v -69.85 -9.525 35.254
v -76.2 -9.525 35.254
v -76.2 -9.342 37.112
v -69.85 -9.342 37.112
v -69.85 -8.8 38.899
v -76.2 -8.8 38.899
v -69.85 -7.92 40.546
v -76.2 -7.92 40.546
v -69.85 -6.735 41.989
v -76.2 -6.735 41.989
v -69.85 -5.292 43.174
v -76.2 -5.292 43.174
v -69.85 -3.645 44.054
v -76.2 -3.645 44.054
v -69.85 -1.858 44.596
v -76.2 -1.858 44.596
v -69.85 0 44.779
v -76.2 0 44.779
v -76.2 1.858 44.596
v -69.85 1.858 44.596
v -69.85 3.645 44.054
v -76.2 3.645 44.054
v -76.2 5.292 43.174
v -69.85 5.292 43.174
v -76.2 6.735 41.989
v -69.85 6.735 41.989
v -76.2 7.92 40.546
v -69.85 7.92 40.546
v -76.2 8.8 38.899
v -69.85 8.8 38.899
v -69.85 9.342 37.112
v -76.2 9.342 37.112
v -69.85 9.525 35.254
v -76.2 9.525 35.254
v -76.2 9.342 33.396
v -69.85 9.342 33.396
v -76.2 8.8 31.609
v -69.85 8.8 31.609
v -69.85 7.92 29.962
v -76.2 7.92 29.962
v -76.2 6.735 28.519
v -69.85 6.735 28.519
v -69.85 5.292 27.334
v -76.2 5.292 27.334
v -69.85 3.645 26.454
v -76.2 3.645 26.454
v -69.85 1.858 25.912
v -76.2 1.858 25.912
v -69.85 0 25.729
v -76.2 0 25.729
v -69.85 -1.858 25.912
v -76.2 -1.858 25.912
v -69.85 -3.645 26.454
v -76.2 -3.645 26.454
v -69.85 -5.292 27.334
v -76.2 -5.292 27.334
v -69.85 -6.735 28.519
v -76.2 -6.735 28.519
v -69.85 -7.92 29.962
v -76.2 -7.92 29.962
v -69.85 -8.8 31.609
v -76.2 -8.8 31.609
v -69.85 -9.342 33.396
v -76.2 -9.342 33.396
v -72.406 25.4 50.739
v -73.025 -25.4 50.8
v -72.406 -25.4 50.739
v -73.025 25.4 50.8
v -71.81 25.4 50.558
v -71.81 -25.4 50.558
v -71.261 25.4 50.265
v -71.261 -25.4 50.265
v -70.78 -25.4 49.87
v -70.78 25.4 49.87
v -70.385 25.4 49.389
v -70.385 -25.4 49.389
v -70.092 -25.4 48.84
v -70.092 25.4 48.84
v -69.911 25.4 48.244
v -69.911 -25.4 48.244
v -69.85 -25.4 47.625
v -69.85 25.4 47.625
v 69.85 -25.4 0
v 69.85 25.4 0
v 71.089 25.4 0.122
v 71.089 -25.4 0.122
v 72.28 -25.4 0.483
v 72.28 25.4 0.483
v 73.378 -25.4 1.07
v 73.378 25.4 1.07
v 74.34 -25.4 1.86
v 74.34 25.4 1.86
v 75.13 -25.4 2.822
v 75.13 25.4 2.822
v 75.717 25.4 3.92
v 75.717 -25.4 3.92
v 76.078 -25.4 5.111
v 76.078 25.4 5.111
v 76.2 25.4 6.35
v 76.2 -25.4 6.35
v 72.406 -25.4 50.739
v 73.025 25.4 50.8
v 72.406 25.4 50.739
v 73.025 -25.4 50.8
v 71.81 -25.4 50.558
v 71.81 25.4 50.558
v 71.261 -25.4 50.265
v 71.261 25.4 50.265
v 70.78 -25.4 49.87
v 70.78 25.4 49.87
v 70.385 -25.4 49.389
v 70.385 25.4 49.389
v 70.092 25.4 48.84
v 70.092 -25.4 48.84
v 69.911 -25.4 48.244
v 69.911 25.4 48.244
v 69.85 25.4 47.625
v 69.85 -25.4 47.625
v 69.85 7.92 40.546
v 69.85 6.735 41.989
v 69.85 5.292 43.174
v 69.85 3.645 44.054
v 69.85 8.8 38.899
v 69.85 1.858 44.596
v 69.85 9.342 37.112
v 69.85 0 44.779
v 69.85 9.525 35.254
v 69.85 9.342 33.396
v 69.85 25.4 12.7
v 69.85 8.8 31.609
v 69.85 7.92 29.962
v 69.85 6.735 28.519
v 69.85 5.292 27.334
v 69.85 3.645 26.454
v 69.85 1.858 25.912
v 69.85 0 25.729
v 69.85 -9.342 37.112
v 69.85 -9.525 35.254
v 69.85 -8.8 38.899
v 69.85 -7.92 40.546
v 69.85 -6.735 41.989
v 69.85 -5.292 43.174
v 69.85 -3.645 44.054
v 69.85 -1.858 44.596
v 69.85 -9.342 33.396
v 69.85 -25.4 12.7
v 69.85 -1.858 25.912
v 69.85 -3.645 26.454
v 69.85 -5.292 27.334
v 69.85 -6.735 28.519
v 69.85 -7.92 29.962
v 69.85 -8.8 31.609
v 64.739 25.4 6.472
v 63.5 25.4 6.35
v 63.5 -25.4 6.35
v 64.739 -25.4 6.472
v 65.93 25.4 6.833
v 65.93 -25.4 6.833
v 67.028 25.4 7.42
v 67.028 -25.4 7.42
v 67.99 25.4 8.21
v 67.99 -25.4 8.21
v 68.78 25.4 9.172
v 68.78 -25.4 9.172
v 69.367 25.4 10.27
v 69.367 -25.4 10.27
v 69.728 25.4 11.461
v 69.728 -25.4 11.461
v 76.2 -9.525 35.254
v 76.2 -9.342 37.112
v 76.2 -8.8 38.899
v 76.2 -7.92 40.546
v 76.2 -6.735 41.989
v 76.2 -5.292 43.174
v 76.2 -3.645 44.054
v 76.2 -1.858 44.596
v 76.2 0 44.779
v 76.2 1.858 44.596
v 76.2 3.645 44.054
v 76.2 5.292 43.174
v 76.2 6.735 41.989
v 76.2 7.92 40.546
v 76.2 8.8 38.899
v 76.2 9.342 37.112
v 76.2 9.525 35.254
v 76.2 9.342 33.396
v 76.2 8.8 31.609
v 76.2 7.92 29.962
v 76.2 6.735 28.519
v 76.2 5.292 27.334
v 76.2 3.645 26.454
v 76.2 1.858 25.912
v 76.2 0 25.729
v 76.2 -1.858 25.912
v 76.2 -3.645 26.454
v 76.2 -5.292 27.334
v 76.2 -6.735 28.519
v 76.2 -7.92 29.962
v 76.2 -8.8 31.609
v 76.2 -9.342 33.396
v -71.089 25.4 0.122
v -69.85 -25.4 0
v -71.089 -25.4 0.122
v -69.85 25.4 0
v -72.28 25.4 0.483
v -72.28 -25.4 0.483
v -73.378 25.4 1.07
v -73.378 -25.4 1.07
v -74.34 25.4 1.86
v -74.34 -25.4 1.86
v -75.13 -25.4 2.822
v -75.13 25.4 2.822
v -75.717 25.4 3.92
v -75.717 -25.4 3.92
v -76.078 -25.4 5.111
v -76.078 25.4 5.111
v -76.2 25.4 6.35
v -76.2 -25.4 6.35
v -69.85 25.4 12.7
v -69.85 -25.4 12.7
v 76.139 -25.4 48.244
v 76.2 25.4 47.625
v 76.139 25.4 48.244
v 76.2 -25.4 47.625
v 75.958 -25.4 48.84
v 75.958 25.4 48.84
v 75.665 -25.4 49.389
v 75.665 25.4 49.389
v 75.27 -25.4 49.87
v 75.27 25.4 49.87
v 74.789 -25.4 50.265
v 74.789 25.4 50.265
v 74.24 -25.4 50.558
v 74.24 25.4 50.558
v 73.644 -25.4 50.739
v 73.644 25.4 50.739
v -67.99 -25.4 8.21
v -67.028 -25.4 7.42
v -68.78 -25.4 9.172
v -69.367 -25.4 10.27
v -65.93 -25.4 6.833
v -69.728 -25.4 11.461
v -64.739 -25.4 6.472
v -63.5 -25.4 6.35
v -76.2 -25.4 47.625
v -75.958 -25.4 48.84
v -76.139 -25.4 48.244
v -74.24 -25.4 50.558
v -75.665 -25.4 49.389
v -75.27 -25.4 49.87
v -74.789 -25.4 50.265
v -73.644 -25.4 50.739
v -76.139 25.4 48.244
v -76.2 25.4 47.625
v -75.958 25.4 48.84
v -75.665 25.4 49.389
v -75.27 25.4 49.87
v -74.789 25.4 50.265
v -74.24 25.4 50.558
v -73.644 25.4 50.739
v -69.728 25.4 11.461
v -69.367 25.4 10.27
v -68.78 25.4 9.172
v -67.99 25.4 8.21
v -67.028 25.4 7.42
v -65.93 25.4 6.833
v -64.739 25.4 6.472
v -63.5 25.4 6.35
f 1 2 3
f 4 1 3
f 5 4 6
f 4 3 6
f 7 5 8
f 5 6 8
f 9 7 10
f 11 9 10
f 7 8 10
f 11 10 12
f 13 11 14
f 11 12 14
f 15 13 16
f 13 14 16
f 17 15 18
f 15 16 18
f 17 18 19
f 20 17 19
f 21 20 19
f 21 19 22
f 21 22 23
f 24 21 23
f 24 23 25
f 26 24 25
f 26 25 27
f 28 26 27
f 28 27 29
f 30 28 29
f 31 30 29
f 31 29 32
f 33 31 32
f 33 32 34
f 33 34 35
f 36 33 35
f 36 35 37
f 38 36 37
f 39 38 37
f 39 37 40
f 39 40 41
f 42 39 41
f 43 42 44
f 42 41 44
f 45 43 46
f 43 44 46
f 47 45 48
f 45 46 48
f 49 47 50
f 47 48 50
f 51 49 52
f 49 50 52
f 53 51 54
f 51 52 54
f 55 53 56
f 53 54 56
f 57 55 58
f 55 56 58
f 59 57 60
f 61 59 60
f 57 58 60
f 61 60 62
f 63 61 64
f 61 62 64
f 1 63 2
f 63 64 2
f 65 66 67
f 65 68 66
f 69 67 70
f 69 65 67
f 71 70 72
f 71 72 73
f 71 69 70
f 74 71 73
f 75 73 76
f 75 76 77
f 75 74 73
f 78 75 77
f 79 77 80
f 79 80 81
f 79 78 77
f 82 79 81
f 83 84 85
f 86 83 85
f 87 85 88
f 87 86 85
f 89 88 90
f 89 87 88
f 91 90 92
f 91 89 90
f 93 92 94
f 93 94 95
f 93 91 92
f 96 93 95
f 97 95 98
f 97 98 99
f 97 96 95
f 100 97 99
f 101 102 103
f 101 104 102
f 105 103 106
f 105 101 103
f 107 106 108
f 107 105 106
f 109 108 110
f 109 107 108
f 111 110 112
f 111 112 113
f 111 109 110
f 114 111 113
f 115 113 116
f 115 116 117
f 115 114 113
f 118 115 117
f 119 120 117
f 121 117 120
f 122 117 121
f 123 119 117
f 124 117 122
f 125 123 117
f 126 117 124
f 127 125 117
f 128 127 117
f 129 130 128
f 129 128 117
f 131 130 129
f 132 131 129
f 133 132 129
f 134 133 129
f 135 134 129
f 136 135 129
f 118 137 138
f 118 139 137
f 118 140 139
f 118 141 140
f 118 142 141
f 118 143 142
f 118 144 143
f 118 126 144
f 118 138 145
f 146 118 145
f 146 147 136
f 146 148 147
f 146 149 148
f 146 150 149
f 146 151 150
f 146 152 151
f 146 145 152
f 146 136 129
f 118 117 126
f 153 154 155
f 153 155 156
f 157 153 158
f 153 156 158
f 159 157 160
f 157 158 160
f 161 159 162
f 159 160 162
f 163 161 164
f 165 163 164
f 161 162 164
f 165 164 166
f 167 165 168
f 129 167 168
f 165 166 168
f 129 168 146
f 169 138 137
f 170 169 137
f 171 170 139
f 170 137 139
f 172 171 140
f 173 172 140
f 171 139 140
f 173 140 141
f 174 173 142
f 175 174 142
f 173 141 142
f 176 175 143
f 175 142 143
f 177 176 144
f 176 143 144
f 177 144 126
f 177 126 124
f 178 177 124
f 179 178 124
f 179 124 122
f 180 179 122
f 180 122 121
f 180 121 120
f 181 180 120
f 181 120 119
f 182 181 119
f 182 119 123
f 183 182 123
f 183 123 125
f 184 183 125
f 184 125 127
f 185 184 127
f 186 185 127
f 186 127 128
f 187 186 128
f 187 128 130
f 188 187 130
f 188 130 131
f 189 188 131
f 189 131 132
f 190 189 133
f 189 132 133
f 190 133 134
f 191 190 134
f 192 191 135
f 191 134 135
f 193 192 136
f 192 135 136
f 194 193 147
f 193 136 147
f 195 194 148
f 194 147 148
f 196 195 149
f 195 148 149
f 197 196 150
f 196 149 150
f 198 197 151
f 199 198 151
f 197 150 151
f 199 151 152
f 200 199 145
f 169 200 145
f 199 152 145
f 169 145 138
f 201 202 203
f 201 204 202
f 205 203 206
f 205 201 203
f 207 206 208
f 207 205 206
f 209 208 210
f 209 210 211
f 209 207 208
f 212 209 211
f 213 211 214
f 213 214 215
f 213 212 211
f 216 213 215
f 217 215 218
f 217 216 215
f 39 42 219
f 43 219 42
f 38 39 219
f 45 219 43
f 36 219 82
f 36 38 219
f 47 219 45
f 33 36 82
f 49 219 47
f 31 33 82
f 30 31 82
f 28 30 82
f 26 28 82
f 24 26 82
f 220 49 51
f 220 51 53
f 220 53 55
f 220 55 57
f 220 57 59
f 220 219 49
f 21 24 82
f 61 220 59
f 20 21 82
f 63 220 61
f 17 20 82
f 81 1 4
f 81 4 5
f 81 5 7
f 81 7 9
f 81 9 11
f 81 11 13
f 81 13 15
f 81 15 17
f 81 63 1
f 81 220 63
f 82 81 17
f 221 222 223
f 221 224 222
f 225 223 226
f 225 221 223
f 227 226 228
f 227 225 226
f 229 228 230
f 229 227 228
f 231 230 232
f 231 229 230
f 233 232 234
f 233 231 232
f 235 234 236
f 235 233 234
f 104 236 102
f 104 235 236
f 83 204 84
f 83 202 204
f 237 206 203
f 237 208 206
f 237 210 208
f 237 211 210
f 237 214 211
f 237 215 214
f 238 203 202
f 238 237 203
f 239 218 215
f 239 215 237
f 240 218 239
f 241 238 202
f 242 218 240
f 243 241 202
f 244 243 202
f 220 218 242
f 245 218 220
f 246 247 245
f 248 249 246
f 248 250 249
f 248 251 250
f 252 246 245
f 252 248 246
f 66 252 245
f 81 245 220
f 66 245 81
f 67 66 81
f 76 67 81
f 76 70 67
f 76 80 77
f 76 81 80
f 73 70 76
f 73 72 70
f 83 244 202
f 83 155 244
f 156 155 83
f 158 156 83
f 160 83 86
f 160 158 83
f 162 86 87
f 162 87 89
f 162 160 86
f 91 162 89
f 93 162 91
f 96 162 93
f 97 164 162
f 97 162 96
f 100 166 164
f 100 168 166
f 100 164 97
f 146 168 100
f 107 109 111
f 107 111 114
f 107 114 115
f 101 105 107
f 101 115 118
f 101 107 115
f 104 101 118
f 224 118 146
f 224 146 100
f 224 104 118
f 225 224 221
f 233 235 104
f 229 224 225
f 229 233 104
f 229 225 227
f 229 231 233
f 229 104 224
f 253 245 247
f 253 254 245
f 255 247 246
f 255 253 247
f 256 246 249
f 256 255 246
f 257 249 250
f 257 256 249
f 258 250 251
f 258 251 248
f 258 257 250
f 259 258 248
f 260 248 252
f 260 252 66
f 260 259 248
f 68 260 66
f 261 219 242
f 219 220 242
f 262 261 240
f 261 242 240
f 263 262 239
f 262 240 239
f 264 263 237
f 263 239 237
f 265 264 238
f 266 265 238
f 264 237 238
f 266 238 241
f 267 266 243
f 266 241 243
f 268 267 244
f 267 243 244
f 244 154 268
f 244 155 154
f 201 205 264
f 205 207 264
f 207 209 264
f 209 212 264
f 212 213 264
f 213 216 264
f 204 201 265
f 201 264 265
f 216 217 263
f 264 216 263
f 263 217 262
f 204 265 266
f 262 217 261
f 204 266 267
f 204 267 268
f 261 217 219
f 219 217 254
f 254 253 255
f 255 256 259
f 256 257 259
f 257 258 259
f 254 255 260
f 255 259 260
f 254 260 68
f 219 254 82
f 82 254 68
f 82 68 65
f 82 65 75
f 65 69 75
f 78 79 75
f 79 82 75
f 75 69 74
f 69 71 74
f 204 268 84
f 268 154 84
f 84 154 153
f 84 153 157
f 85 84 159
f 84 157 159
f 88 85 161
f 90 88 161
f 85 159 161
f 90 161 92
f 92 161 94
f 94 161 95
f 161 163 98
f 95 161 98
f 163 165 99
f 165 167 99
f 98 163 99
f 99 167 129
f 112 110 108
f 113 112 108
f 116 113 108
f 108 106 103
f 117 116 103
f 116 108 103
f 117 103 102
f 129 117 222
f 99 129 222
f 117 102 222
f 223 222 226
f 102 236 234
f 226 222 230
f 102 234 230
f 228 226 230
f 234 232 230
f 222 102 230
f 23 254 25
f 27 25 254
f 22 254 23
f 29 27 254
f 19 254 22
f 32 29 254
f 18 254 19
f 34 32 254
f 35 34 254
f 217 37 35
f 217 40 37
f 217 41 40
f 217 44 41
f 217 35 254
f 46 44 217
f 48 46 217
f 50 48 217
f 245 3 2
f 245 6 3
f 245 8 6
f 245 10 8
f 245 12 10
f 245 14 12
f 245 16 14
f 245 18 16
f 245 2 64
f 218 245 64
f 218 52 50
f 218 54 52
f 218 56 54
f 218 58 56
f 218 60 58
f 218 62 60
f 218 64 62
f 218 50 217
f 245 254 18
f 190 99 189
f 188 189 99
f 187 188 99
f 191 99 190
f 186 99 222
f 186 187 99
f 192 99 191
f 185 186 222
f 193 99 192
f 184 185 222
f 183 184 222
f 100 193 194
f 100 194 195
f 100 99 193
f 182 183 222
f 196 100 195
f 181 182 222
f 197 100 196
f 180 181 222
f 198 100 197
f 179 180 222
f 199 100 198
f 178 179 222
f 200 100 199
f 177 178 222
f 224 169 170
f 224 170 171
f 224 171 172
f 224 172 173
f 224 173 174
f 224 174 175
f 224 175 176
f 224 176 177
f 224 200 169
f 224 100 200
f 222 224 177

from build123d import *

# Parameters (mm, degrees)
F1_DEPTH = 25.4
F2_R     = 6.35
F3_R     = 3.17499
F4_R     = 9.525
F5_DEPTH = 152.401


# Not quite as in the source:
# - a fillet or chamfer is up to 0.001 mm smaller than in the source, because OpenCascade refuses the exact size


with BuildPart() as f1:
    # F0 (on Front) → F1 (new body, symmetric)
    with BuildSketch(Plane.XZ):
        Polygon((-76.2, 0), (0, 0), (76.2, 0), (76.2, 50.8), (69.85, 50.8), (69.85, 6.35), (0, 6.35), (-69.85, 6.35), (-69.85, 50.8), (-76.2, 50.8), align=None)
    extrude(amount=F1_DEPTH, both=True)

    # F2
    f2_edges = [f1.edges().sort_by_distance(p)[0] for p in [
        (-69.85, 0, 6.35),
        (69.85, 0, 6.35),
        (76.2, 0, 0),
        (-76.2, 0, 0),
    ]]
    fillet(f2_edges, radius=F2_R)

    # F3 (radius 3.175 in the source; OpenCascade refuses exactly that, so slightly less here)
    f3_edges = [f1.edges().sort_by_distance(p)[0] for p in [
        (-69.85, 0, 50.8),
        (-76.2, 0, 50.8),
        (69.85, 0, 50.8),
        (76.2, 0, 50.8),
    ]]
    fillet(f3_edges, radius=F3_R)

    # F4 (on face) → F5 (cut, through all)
    with BuildSketch(Plane(origin=(-76.2, 0, 0), x_dir=(0, -1, 0), z_dir=(-1, 0, 0))):
        with Locations((0, 35.2541096509)):
            Circle(F4_R)
    extrude(amount=-F5_DEPTH, mode=Mode.SUBTRACT)


solid = f1.part
